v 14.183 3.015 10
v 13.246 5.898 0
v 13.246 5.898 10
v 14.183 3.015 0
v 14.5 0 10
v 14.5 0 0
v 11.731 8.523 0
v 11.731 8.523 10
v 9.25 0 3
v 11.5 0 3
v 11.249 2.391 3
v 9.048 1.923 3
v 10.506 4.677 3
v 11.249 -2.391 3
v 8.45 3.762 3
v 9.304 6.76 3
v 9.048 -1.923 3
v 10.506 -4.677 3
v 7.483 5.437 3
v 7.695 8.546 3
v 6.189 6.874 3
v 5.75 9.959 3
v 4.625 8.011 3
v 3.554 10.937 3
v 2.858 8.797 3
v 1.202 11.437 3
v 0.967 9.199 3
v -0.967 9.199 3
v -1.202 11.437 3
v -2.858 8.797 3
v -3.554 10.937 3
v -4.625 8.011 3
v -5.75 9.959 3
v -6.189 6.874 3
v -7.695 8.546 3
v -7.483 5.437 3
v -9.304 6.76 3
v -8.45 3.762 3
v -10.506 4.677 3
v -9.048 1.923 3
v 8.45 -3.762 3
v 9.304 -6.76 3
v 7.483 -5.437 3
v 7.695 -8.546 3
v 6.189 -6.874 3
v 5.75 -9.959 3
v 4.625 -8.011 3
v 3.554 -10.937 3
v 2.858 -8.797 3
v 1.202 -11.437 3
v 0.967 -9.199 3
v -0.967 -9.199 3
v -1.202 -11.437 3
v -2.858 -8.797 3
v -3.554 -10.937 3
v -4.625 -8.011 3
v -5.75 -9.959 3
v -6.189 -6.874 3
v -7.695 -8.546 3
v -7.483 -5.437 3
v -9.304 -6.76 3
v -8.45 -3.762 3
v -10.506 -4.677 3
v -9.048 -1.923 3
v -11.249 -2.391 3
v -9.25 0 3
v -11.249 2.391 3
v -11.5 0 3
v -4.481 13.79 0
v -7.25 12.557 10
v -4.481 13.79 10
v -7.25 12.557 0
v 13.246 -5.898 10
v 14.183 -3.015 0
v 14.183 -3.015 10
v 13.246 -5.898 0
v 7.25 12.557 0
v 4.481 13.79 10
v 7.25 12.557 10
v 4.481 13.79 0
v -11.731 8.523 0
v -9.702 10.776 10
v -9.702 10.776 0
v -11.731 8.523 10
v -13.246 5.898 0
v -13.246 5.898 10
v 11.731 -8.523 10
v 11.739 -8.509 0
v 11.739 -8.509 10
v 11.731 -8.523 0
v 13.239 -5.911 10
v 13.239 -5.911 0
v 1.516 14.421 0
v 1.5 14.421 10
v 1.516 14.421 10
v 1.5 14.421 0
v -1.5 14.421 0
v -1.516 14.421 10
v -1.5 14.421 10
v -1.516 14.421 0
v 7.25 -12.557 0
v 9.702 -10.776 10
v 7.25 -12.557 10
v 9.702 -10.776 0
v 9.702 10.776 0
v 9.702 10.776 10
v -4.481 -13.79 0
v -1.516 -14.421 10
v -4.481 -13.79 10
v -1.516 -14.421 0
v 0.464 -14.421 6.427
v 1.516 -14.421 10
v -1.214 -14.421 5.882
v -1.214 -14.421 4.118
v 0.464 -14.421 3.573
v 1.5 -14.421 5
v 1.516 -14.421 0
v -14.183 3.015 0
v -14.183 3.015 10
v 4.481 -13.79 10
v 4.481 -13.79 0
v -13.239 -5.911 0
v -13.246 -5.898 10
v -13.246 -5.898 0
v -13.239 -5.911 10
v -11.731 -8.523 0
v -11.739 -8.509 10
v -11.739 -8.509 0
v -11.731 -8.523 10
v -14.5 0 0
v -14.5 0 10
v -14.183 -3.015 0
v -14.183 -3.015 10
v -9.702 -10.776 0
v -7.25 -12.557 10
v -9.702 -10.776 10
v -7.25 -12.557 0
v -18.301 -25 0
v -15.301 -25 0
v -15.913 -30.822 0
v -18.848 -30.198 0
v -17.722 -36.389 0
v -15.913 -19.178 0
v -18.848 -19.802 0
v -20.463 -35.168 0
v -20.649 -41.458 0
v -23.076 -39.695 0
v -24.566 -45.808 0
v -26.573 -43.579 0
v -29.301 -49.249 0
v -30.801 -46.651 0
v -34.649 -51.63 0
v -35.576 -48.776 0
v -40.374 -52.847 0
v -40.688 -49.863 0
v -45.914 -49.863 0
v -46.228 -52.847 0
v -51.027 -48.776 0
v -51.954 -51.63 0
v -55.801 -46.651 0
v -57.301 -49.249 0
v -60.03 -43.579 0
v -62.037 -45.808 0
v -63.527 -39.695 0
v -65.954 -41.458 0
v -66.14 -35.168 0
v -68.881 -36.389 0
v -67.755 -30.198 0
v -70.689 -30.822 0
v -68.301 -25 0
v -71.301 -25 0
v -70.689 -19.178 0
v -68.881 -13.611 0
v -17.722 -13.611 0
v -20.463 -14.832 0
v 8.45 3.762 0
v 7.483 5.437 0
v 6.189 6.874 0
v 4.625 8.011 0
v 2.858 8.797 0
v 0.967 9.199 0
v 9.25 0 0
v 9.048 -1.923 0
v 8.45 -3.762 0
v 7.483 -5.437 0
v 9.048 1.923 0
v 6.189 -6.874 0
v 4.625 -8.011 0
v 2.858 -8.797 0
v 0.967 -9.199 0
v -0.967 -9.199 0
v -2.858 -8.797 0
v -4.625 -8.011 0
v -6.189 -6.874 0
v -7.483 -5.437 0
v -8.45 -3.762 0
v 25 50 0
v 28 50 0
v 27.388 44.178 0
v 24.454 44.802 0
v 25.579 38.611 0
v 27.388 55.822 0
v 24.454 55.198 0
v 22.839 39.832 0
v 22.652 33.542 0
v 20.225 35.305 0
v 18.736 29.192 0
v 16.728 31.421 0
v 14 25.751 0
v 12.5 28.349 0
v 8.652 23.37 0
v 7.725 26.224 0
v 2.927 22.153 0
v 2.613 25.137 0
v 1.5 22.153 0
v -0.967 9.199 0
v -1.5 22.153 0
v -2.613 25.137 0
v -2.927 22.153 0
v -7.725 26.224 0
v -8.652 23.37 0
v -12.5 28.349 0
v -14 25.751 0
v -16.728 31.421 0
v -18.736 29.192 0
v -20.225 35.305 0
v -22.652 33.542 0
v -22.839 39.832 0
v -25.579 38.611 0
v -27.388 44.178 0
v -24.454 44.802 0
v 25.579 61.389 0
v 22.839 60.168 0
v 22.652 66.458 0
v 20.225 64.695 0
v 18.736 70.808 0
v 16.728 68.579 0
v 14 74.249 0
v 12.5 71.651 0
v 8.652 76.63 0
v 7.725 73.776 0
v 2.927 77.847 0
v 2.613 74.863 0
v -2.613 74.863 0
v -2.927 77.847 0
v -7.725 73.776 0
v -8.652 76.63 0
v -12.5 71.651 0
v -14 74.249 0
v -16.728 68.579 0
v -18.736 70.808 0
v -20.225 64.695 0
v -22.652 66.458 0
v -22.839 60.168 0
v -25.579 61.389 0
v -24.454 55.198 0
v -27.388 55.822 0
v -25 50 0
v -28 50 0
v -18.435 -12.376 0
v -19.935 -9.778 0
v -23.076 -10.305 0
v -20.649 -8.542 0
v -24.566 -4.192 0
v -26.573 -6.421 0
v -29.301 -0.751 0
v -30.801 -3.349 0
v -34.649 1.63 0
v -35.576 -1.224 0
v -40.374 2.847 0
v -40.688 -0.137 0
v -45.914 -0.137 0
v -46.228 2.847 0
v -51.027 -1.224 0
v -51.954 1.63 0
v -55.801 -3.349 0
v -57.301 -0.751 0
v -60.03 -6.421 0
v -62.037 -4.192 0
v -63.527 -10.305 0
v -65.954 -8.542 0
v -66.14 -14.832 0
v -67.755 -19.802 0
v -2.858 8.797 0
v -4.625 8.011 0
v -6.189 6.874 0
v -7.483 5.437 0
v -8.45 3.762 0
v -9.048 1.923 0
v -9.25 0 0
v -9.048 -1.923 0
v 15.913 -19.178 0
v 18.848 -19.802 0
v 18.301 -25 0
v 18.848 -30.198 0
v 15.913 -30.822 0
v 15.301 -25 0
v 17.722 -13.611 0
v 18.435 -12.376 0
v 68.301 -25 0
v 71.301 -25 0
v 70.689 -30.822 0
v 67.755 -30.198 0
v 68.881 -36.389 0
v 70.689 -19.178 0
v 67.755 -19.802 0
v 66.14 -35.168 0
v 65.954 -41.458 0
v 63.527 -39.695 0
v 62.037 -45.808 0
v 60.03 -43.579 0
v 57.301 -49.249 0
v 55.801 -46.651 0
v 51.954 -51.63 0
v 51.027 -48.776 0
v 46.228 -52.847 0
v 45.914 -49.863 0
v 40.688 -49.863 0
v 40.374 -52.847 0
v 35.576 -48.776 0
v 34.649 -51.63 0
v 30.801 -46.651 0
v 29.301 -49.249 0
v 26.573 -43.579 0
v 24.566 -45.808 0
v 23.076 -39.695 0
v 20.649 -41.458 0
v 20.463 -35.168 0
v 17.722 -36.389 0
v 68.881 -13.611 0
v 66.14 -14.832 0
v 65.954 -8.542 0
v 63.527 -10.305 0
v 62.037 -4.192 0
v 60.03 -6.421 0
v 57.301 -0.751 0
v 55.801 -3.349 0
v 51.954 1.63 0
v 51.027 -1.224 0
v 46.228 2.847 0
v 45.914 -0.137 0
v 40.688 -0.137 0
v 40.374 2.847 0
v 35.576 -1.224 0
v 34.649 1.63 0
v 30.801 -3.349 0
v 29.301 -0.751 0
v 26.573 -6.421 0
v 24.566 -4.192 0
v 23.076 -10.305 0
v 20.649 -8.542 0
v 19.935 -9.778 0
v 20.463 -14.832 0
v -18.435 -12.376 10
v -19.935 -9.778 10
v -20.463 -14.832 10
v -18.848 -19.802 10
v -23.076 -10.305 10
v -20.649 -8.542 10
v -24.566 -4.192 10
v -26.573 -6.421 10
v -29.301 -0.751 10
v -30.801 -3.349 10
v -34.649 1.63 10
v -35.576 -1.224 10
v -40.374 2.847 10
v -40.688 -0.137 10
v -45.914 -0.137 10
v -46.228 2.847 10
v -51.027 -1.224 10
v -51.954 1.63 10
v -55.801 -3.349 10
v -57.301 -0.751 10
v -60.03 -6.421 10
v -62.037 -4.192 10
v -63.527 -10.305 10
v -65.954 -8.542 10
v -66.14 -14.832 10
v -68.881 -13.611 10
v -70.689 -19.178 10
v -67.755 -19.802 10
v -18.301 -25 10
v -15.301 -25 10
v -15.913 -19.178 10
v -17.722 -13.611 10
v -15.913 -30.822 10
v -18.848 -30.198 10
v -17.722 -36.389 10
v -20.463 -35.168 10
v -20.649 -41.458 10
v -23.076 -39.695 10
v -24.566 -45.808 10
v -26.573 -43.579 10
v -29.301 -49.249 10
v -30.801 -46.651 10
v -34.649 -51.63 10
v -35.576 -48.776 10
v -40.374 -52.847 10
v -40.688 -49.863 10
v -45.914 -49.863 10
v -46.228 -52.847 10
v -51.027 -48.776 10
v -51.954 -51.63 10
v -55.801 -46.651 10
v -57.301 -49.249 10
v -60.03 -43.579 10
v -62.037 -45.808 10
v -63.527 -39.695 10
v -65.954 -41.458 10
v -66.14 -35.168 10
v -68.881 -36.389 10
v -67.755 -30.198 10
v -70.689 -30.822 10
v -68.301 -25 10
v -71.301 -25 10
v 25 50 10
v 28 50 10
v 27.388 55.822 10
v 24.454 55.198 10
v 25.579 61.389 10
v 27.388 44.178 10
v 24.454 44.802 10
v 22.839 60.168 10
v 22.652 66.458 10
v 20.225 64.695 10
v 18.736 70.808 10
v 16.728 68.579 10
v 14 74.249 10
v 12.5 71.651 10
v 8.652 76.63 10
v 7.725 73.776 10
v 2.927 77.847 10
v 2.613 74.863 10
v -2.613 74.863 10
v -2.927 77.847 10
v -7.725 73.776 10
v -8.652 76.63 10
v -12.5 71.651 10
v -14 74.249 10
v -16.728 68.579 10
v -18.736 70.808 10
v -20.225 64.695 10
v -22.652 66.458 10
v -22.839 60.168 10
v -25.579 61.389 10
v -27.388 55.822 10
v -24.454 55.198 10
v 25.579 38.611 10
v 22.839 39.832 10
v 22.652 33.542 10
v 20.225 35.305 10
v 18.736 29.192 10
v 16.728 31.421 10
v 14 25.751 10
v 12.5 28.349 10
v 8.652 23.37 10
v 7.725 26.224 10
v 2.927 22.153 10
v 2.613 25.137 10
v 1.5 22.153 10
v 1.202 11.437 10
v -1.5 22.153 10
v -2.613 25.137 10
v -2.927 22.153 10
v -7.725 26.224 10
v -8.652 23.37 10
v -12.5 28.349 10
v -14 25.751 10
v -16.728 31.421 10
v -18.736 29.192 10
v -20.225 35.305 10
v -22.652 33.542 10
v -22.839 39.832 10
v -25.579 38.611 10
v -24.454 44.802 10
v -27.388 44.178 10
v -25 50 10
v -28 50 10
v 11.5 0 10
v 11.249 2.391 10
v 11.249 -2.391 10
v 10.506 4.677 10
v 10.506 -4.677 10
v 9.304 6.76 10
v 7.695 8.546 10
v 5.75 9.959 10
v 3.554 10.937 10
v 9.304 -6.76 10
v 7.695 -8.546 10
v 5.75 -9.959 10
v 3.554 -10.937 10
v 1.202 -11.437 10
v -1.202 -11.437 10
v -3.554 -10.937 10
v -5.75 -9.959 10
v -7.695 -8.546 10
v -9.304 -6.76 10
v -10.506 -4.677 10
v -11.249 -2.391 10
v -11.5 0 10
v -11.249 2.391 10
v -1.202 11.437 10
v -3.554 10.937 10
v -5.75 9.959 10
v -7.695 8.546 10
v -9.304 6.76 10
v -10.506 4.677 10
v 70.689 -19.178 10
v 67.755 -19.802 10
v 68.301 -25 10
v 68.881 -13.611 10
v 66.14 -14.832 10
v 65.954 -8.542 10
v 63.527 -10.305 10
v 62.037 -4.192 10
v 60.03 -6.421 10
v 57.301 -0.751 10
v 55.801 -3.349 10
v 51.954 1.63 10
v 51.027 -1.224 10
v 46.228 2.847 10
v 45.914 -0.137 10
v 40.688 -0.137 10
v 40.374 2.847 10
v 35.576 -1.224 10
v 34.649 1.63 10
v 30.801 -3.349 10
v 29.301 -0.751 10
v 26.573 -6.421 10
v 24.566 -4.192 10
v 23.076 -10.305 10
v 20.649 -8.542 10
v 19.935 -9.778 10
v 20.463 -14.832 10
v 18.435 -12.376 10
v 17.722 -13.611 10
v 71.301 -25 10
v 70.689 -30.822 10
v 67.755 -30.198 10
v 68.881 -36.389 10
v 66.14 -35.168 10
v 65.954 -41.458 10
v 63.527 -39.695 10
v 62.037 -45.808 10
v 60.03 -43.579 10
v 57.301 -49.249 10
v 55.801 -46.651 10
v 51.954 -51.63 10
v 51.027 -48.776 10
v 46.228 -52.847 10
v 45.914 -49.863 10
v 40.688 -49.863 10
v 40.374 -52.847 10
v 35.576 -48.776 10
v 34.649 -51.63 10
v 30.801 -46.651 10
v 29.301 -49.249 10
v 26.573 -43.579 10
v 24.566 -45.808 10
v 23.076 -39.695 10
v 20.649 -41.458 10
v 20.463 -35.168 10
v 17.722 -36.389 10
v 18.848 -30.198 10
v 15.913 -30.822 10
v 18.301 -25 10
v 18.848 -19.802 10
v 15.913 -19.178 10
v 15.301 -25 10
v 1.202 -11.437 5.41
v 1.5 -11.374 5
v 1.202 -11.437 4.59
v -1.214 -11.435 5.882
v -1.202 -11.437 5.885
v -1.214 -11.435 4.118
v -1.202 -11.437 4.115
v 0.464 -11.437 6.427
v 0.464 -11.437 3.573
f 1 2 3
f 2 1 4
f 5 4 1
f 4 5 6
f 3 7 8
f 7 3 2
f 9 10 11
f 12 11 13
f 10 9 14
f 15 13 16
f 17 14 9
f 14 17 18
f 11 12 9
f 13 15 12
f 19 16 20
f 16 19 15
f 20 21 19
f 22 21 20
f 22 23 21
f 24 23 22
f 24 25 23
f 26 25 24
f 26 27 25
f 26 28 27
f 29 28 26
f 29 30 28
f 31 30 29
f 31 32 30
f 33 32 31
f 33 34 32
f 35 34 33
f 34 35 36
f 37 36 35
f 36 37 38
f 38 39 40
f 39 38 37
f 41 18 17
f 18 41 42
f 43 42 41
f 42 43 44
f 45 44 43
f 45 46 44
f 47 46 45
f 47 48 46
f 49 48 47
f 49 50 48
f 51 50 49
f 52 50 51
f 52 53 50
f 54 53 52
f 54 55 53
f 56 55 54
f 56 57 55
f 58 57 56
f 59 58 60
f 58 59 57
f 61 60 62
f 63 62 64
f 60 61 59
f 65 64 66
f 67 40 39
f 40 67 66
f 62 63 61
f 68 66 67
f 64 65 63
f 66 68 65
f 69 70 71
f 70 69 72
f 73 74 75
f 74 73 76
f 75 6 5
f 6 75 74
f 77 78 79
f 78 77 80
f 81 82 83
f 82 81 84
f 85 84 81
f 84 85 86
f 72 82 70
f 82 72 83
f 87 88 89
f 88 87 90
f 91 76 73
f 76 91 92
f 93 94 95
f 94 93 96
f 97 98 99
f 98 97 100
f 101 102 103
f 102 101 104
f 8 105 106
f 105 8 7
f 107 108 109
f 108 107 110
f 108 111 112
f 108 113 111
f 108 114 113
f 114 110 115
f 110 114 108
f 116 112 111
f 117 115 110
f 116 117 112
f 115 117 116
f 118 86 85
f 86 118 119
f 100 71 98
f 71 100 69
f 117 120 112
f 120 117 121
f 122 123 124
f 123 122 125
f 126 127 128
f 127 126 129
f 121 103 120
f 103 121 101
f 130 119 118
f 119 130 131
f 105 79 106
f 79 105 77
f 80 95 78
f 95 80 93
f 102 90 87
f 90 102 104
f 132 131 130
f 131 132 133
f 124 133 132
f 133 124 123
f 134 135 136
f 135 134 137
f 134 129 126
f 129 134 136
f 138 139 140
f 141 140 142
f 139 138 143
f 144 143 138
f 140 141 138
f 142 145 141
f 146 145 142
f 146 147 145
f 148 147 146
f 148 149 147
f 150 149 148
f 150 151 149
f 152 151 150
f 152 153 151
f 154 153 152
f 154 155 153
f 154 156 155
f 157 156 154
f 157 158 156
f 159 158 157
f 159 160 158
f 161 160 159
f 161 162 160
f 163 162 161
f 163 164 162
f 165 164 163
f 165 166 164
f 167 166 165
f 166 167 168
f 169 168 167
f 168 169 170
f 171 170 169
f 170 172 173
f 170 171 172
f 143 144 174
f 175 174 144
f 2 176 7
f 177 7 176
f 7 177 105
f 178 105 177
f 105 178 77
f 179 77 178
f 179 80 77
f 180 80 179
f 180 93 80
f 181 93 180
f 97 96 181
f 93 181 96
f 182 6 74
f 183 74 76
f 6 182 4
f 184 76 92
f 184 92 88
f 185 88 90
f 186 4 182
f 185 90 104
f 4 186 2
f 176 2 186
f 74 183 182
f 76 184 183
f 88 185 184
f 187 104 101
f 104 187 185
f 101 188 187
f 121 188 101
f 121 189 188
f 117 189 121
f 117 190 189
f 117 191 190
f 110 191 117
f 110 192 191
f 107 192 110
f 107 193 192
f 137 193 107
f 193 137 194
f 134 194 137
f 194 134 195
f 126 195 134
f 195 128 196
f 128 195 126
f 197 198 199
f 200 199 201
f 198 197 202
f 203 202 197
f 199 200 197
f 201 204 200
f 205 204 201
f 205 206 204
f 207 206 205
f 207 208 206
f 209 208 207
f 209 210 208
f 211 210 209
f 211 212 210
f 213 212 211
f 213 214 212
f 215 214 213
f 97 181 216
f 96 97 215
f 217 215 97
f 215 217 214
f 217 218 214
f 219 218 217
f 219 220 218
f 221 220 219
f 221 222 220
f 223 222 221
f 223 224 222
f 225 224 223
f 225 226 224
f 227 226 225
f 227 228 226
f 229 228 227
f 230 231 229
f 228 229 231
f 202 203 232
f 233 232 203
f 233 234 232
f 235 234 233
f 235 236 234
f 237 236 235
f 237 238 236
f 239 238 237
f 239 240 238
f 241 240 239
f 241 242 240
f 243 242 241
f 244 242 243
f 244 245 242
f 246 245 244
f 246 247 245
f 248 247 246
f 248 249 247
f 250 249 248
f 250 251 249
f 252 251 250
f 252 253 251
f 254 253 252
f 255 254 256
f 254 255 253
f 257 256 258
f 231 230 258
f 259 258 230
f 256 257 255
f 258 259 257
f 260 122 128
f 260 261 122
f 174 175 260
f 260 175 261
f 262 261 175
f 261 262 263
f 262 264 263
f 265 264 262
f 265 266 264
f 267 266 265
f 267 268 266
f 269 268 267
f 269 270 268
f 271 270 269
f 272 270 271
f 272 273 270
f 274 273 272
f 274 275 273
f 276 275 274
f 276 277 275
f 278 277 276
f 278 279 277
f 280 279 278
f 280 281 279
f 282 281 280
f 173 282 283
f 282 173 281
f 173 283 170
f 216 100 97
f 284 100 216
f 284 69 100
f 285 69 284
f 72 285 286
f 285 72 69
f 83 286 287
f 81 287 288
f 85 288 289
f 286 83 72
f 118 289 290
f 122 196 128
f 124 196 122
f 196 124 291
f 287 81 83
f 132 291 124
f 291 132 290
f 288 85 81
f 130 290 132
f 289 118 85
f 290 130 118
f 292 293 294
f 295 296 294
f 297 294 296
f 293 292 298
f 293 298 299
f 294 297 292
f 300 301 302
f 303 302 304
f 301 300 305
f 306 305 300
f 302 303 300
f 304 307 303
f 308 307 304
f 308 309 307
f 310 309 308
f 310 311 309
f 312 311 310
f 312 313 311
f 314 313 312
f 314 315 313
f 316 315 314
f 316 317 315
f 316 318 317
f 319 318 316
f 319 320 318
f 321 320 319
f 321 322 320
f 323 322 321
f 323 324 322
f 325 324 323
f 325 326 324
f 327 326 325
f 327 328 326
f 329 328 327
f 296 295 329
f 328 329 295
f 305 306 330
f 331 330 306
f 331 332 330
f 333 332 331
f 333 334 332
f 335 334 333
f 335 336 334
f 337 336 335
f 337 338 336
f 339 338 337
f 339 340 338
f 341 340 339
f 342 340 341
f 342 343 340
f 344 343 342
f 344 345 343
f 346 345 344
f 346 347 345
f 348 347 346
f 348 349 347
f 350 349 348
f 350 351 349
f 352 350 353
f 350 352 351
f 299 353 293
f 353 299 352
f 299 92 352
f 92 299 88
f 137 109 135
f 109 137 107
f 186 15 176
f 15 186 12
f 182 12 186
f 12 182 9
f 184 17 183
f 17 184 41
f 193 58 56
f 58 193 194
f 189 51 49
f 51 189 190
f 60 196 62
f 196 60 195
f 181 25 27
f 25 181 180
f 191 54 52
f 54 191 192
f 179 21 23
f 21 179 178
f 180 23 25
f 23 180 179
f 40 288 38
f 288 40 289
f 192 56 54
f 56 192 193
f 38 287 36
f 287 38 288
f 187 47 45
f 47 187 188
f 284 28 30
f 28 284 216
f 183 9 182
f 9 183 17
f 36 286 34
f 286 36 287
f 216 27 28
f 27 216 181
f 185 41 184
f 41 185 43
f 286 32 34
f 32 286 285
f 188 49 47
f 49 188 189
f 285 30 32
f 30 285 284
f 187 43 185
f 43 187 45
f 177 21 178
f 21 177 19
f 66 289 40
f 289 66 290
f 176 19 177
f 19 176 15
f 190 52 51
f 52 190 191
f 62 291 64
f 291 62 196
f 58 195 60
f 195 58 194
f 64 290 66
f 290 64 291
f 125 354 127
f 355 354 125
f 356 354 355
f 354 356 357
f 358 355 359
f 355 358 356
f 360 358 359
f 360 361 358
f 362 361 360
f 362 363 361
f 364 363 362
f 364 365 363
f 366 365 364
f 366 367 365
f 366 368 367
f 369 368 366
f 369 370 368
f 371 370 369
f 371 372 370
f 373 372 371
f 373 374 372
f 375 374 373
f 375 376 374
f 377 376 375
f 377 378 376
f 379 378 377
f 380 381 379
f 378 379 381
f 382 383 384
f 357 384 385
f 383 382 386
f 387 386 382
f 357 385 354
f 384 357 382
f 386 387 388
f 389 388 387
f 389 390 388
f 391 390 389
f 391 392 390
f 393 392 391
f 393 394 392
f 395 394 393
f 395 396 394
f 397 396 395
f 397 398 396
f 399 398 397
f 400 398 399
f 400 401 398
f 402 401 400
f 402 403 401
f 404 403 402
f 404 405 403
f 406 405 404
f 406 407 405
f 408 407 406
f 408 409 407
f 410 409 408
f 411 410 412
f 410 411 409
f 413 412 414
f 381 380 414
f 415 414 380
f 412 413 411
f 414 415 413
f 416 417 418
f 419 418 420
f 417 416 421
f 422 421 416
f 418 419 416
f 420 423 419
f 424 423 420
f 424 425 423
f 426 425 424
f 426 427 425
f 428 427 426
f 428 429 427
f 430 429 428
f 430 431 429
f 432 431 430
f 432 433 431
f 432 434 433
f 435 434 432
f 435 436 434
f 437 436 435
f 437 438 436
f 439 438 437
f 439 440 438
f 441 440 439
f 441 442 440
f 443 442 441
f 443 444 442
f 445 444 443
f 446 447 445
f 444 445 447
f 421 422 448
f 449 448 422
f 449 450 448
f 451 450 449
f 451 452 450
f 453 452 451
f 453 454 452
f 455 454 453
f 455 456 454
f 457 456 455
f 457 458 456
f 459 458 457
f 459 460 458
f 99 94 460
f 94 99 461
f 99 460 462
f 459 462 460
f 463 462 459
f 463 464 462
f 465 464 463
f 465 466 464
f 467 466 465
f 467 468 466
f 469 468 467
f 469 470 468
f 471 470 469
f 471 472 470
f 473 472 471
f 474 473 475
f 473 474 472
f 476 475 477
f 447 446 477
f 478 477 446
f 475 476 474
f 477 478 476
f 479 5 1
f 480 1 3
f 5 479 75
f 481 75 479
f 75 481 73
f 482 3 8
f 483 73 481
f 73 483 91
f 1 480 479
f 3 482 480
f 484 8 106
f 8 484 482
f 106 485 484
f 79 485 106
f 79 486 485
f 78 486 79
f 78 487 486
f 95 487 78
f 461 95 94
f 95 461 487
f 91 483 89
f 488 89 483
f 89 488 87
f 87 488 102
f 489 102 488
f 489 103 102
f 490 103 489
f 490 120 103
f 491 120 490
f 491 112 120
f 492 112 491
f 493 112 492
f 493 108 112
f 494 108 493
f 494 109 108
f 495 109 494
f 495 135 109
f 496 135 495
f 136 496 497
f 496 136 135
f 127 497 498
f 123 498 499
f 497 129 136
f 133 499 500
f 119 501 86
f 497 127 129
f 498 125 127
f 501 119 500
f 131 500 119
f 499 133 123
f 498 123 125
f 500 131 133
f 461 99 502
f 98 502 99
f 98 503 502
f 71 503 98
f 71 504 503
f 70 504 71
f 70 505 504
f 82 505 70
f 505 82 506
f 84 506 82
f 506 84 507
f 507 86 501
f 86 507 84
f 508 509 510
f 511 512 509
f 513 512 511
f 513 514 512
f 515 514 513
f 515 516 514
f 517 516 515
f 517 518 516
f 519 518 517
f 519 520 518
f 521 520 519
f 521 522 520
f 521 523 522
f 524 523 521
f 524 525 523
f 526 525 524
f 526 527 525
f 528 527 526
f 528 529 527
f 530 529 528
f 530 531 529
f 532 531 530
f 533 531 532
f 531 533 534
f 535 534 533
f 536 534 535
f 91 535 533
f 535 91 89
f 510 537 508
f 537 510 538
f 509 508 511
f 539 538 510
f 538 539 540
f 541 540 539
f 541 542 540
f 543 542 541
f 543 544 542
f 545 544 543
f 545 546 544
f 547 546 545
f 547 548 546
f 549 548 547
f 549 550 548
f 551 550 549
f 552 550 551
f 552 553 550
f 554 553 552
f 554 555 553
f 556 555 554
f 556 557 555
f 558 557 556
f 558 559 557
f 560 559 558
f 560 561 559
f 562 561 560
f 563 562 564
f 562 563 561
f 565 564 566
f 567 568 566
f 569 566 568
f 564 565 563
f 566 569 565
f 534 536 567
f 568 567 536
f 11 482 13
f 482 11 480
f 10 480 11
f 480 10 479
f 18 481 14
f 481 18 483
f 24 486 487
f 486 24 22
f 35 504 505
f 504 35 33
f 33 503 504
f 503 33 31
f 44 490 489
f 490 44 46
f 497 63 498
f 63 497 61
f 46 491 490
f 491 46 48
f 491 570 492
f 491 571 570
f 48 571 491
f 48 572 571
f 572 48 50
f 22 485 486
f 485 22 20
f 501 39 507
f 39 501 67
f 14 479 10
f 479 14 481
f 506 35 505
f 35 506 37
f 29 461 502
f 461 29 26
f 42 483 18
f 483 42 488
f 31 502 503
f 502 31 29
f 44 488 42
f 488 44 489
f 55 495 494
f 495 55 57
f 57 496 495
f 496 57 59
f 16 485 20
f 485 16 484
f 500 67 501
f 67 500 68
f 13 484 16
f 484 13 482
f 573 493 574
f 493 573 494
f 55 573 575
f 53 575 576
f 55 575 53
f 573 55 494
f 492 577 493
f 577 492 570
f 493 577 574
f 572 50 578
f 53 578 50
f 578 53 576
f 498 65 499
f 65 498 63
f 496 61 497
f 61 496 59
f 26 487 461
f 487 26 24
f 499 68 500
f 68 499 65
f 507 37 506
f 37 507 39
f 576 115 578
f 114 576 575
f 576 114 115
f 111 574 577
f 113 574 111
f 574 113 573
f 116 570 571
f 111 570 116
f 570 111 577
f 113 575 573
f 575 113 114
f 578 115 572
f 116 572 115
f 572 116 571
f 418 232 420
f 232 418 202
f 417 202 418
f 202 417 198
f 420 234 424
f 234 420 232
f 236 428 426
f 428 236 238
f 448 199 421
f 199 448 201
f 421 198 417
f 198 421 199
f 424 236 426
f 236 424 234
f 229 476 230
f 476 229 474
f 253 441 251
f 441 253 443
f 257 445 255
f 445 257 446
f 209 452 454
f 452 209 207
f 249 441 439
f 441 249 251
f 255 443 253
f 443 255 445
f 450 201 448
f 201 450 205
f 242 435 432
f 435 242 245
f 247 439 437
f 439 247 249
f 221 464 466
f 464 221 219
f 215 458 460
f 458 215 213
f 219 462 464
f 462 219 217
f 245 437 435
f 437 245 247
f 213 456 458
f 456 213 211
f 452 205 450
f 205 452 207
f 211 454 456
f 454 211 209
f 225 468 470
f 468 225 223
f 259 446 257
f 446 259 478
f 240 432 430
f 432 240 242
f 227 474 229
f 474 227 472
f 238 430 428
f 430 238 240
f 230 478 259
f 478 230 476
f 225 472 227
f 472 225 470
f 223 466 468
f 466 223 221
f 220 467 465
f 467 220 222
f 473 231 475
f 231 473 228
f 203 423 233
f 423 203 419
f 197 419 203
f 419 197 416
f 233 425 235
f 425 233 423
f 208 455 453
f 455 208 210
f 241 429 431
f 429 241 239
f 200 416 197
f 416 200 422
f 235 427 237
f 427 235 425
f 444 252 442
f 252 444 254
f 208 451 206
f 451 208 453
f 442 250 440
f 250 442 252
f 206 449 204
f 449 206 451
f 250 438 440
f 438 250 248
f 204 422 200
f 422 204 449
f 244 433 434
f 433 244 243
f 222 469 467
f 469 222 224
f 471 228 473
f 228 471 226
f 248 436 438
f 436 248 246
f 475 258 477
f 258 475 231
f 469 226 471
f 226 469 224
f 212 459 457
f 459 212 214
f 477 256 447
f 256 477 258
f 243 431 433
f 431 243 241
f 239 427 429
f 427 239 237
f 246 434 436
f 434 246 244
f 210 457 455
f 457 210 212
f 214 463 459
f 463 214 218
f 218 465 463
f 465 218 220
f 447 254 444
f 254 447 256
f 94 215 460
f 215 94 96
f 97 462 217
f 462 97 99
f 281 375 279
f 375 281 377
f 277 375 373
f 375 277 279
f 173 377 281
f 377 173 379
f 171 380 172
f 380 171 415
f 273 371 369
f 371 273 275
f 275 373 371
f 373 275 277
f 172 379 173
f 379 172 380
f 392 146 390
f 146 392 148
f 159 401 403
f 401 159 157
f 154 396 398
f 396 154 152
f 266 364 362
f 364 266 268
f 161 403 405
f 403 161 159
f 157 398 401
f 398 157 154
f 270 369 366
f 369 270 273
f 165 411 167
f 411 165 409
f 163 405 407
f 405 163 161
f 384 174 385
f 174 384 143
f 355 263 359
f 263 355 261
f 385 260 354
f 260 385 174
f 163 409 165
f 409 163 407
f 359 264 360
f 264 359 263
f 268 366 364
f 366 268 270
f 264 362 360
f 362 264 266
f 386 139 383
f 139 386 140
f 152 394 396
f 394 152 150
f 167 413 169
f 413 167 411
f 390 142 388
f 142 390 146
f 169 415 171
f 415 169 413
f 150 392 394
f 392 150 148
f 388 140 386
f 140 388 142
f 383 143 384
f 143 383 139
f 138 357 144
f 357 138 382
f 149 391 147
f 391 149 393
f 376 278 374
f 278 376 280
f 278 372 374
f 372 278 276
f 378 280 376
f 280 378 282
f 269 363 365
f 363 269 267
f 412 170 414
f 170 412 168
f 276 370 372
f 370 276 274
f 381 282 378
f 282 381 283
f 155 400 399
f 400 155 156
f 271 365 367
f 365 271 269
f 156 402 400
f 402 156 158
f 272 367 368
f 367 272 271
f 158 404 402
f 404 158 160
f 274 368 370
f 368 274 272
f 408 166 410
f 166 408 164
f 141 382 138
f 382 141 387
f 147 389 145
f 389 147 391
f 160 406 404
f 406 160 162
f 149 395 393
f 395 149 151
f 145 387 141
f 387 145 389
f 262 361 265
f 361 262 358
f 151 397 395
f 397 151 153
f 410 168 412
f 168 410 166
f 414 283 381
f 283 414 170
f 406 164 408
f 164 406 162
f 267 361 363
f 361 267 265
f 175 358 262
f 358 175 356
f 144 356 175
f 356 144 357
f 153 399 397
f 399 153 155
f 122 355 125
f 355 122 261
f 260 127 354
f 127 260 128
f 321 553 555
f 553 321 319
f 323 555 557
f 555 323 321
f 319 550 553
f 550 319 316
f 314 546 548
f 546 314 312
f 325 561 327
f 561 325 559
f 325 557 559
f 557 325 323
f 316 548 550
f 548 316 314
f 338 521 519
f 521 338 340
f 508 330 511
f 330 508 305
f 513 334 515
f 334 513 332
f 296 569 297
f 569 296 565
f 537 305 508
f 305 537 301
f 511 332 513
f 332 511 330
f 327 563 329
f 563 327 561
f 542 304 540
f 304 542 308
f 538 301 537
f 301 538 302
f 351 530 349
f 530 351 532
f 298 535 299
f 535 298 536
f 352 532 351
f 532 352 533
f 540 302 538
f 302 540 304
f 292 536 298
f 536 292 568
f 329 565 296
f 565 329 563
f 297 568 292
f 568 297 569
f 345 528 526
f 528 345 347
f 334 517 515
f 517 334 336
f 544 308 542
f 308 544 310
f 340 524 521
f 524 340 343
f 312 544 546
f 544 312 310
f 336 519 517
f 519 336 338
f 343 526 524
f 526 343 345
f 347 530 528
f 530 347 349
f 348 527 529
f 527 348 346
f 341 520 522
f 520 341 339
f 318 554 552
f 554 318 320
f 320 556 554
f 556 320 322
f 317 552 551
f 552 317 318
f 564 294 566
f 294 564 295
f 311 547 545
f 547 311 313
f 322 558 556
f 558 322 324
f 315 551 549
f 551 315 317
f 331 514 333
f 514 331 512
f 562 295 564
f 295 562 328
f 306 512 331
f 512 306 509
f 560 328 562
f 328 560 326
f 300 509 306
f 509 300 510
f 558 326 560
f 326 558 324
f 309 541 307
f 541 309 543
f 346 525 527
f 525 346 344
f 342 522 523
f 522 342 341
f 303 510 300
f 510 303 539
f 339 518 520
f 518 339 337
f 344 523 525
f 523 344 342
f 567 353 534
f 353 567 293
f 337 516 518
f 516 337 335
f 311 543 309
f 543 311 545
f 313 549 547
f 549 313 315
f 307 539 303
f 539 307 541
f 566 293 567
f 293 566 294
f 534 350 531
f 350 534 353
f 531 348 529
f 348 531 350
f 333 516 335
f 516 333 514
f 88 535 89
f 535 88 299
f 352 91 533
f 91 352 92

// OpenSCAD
ball_od = 50;
ball_offset = 50;
thick = 3;
height = 10;

union() {
	difference() {
		union() {
			difference() {
				cylinder(d = 29, h = 3);
				translate(v = [0, 0, -1.5000000000]) {
					cylinder(d = 18.5000000000, h = 6);
				}
			}
			difference() {
				cylinder(d = 29, h = 10);
				translate(v = [0, 0, -5.0000000000]) {
					cylinder(d = 23, h = 20);
				}
			}
		}
		translate(v = [0, 0, 5.0000000000]) {
			rotate(a = [90, 0, 0]) {
				cylinder(d = 3, h = 30);
			}
		}
	}
	translate(v = [0, ((((ball_offset - ((ball_od / 2) + 14.5)) / 2) + 14.5) - (thick / 2)), 0]) {
		translate(v = [0, 0, (height / 2)]) {
			cube(center = true, size = [thick, (ball_offset - ((ball_od / 2) + 14.5)), height]);
		}
	}
	translate(v = [0, ball_offset, 0]) {
		difference() {
			cylinder(d = (ball_od + (2 * thick)), h = height);
			translate(v = [0, 0, (-(height / 2))]) {
				cylinder(d = ball_od, h = (2 * height));
			}
		}
	}
	rotate(a = [0, 0, 0.0000000000]) {
		union() {
			translate(v = [0, ((((ball_offset - ((ball_od / 2) + 14.5)) / 2) + 14.5) - (thick / 2)), 0]) {
				translate(v = [0, 0, (height / 2)]) {
					cube(center = true, size = [thick, (ball_offset - ((ball_od / 2) + 14.5)), height]);
				}
			}
			translate(v = [0, ball_offset, 0]) {
				difference() {
					cylinder(d = (ball_od + (2 * thick)), h = height);
					translate(v = [0, 0, (-(height / 2))]) {
						cylinder(d = ball_od, h = (2 * height));
					}
				}
			}
		}
	}
	rotate(a = [0, 0, 120.0000000000]) {
		union() {
			translate(v = [0, ((((ball_offset - ((ball_od / 2) + 14.5)) / 2) + 14.5) - (thick / 2)), 0]) {
				translate(v = [0, 0, (height / 2)]) {
					cube(center = true, size = [thick, (ball_offset - ((ball_od / 2) + 14.5)), height]);
				}
			}
			translate(v = [0, ball_offset, 0]) {
				difference() {
					cylinder(d = (ball_od + (2 * thick)), h = height);
					translate(v = [0, 0, (-(height / 2))]) {
						cylinder(d = ball_od, h = (2 * height));
					}
				}
			}
		}
	}
	rotate(a = [0, 0, 240.0000000000]) {
		union() {
			translate(v = [0, ((((ball_offset - ((ball_od / 2) + 14.5)) / 2) + 14.5) - (thick / 2)), 0]) {
				translate(v = [0, 0, (height / 2)]) {
					cube(center = true, size = [thick, (ball_offset - ((ball_od / 2) + 14.5)), height]);
				}
			}
			translate(v = [0, ball_offset, 0]) {
				difference() {
					cylinder(d = (ball_od + (2 * thick)), h = height);
					translate(v = [0, 0, (-(height / 2))]) {
						cylinder(d = ball_od, h = (2 * height));
					}
				}
			}
		}
	}
}
